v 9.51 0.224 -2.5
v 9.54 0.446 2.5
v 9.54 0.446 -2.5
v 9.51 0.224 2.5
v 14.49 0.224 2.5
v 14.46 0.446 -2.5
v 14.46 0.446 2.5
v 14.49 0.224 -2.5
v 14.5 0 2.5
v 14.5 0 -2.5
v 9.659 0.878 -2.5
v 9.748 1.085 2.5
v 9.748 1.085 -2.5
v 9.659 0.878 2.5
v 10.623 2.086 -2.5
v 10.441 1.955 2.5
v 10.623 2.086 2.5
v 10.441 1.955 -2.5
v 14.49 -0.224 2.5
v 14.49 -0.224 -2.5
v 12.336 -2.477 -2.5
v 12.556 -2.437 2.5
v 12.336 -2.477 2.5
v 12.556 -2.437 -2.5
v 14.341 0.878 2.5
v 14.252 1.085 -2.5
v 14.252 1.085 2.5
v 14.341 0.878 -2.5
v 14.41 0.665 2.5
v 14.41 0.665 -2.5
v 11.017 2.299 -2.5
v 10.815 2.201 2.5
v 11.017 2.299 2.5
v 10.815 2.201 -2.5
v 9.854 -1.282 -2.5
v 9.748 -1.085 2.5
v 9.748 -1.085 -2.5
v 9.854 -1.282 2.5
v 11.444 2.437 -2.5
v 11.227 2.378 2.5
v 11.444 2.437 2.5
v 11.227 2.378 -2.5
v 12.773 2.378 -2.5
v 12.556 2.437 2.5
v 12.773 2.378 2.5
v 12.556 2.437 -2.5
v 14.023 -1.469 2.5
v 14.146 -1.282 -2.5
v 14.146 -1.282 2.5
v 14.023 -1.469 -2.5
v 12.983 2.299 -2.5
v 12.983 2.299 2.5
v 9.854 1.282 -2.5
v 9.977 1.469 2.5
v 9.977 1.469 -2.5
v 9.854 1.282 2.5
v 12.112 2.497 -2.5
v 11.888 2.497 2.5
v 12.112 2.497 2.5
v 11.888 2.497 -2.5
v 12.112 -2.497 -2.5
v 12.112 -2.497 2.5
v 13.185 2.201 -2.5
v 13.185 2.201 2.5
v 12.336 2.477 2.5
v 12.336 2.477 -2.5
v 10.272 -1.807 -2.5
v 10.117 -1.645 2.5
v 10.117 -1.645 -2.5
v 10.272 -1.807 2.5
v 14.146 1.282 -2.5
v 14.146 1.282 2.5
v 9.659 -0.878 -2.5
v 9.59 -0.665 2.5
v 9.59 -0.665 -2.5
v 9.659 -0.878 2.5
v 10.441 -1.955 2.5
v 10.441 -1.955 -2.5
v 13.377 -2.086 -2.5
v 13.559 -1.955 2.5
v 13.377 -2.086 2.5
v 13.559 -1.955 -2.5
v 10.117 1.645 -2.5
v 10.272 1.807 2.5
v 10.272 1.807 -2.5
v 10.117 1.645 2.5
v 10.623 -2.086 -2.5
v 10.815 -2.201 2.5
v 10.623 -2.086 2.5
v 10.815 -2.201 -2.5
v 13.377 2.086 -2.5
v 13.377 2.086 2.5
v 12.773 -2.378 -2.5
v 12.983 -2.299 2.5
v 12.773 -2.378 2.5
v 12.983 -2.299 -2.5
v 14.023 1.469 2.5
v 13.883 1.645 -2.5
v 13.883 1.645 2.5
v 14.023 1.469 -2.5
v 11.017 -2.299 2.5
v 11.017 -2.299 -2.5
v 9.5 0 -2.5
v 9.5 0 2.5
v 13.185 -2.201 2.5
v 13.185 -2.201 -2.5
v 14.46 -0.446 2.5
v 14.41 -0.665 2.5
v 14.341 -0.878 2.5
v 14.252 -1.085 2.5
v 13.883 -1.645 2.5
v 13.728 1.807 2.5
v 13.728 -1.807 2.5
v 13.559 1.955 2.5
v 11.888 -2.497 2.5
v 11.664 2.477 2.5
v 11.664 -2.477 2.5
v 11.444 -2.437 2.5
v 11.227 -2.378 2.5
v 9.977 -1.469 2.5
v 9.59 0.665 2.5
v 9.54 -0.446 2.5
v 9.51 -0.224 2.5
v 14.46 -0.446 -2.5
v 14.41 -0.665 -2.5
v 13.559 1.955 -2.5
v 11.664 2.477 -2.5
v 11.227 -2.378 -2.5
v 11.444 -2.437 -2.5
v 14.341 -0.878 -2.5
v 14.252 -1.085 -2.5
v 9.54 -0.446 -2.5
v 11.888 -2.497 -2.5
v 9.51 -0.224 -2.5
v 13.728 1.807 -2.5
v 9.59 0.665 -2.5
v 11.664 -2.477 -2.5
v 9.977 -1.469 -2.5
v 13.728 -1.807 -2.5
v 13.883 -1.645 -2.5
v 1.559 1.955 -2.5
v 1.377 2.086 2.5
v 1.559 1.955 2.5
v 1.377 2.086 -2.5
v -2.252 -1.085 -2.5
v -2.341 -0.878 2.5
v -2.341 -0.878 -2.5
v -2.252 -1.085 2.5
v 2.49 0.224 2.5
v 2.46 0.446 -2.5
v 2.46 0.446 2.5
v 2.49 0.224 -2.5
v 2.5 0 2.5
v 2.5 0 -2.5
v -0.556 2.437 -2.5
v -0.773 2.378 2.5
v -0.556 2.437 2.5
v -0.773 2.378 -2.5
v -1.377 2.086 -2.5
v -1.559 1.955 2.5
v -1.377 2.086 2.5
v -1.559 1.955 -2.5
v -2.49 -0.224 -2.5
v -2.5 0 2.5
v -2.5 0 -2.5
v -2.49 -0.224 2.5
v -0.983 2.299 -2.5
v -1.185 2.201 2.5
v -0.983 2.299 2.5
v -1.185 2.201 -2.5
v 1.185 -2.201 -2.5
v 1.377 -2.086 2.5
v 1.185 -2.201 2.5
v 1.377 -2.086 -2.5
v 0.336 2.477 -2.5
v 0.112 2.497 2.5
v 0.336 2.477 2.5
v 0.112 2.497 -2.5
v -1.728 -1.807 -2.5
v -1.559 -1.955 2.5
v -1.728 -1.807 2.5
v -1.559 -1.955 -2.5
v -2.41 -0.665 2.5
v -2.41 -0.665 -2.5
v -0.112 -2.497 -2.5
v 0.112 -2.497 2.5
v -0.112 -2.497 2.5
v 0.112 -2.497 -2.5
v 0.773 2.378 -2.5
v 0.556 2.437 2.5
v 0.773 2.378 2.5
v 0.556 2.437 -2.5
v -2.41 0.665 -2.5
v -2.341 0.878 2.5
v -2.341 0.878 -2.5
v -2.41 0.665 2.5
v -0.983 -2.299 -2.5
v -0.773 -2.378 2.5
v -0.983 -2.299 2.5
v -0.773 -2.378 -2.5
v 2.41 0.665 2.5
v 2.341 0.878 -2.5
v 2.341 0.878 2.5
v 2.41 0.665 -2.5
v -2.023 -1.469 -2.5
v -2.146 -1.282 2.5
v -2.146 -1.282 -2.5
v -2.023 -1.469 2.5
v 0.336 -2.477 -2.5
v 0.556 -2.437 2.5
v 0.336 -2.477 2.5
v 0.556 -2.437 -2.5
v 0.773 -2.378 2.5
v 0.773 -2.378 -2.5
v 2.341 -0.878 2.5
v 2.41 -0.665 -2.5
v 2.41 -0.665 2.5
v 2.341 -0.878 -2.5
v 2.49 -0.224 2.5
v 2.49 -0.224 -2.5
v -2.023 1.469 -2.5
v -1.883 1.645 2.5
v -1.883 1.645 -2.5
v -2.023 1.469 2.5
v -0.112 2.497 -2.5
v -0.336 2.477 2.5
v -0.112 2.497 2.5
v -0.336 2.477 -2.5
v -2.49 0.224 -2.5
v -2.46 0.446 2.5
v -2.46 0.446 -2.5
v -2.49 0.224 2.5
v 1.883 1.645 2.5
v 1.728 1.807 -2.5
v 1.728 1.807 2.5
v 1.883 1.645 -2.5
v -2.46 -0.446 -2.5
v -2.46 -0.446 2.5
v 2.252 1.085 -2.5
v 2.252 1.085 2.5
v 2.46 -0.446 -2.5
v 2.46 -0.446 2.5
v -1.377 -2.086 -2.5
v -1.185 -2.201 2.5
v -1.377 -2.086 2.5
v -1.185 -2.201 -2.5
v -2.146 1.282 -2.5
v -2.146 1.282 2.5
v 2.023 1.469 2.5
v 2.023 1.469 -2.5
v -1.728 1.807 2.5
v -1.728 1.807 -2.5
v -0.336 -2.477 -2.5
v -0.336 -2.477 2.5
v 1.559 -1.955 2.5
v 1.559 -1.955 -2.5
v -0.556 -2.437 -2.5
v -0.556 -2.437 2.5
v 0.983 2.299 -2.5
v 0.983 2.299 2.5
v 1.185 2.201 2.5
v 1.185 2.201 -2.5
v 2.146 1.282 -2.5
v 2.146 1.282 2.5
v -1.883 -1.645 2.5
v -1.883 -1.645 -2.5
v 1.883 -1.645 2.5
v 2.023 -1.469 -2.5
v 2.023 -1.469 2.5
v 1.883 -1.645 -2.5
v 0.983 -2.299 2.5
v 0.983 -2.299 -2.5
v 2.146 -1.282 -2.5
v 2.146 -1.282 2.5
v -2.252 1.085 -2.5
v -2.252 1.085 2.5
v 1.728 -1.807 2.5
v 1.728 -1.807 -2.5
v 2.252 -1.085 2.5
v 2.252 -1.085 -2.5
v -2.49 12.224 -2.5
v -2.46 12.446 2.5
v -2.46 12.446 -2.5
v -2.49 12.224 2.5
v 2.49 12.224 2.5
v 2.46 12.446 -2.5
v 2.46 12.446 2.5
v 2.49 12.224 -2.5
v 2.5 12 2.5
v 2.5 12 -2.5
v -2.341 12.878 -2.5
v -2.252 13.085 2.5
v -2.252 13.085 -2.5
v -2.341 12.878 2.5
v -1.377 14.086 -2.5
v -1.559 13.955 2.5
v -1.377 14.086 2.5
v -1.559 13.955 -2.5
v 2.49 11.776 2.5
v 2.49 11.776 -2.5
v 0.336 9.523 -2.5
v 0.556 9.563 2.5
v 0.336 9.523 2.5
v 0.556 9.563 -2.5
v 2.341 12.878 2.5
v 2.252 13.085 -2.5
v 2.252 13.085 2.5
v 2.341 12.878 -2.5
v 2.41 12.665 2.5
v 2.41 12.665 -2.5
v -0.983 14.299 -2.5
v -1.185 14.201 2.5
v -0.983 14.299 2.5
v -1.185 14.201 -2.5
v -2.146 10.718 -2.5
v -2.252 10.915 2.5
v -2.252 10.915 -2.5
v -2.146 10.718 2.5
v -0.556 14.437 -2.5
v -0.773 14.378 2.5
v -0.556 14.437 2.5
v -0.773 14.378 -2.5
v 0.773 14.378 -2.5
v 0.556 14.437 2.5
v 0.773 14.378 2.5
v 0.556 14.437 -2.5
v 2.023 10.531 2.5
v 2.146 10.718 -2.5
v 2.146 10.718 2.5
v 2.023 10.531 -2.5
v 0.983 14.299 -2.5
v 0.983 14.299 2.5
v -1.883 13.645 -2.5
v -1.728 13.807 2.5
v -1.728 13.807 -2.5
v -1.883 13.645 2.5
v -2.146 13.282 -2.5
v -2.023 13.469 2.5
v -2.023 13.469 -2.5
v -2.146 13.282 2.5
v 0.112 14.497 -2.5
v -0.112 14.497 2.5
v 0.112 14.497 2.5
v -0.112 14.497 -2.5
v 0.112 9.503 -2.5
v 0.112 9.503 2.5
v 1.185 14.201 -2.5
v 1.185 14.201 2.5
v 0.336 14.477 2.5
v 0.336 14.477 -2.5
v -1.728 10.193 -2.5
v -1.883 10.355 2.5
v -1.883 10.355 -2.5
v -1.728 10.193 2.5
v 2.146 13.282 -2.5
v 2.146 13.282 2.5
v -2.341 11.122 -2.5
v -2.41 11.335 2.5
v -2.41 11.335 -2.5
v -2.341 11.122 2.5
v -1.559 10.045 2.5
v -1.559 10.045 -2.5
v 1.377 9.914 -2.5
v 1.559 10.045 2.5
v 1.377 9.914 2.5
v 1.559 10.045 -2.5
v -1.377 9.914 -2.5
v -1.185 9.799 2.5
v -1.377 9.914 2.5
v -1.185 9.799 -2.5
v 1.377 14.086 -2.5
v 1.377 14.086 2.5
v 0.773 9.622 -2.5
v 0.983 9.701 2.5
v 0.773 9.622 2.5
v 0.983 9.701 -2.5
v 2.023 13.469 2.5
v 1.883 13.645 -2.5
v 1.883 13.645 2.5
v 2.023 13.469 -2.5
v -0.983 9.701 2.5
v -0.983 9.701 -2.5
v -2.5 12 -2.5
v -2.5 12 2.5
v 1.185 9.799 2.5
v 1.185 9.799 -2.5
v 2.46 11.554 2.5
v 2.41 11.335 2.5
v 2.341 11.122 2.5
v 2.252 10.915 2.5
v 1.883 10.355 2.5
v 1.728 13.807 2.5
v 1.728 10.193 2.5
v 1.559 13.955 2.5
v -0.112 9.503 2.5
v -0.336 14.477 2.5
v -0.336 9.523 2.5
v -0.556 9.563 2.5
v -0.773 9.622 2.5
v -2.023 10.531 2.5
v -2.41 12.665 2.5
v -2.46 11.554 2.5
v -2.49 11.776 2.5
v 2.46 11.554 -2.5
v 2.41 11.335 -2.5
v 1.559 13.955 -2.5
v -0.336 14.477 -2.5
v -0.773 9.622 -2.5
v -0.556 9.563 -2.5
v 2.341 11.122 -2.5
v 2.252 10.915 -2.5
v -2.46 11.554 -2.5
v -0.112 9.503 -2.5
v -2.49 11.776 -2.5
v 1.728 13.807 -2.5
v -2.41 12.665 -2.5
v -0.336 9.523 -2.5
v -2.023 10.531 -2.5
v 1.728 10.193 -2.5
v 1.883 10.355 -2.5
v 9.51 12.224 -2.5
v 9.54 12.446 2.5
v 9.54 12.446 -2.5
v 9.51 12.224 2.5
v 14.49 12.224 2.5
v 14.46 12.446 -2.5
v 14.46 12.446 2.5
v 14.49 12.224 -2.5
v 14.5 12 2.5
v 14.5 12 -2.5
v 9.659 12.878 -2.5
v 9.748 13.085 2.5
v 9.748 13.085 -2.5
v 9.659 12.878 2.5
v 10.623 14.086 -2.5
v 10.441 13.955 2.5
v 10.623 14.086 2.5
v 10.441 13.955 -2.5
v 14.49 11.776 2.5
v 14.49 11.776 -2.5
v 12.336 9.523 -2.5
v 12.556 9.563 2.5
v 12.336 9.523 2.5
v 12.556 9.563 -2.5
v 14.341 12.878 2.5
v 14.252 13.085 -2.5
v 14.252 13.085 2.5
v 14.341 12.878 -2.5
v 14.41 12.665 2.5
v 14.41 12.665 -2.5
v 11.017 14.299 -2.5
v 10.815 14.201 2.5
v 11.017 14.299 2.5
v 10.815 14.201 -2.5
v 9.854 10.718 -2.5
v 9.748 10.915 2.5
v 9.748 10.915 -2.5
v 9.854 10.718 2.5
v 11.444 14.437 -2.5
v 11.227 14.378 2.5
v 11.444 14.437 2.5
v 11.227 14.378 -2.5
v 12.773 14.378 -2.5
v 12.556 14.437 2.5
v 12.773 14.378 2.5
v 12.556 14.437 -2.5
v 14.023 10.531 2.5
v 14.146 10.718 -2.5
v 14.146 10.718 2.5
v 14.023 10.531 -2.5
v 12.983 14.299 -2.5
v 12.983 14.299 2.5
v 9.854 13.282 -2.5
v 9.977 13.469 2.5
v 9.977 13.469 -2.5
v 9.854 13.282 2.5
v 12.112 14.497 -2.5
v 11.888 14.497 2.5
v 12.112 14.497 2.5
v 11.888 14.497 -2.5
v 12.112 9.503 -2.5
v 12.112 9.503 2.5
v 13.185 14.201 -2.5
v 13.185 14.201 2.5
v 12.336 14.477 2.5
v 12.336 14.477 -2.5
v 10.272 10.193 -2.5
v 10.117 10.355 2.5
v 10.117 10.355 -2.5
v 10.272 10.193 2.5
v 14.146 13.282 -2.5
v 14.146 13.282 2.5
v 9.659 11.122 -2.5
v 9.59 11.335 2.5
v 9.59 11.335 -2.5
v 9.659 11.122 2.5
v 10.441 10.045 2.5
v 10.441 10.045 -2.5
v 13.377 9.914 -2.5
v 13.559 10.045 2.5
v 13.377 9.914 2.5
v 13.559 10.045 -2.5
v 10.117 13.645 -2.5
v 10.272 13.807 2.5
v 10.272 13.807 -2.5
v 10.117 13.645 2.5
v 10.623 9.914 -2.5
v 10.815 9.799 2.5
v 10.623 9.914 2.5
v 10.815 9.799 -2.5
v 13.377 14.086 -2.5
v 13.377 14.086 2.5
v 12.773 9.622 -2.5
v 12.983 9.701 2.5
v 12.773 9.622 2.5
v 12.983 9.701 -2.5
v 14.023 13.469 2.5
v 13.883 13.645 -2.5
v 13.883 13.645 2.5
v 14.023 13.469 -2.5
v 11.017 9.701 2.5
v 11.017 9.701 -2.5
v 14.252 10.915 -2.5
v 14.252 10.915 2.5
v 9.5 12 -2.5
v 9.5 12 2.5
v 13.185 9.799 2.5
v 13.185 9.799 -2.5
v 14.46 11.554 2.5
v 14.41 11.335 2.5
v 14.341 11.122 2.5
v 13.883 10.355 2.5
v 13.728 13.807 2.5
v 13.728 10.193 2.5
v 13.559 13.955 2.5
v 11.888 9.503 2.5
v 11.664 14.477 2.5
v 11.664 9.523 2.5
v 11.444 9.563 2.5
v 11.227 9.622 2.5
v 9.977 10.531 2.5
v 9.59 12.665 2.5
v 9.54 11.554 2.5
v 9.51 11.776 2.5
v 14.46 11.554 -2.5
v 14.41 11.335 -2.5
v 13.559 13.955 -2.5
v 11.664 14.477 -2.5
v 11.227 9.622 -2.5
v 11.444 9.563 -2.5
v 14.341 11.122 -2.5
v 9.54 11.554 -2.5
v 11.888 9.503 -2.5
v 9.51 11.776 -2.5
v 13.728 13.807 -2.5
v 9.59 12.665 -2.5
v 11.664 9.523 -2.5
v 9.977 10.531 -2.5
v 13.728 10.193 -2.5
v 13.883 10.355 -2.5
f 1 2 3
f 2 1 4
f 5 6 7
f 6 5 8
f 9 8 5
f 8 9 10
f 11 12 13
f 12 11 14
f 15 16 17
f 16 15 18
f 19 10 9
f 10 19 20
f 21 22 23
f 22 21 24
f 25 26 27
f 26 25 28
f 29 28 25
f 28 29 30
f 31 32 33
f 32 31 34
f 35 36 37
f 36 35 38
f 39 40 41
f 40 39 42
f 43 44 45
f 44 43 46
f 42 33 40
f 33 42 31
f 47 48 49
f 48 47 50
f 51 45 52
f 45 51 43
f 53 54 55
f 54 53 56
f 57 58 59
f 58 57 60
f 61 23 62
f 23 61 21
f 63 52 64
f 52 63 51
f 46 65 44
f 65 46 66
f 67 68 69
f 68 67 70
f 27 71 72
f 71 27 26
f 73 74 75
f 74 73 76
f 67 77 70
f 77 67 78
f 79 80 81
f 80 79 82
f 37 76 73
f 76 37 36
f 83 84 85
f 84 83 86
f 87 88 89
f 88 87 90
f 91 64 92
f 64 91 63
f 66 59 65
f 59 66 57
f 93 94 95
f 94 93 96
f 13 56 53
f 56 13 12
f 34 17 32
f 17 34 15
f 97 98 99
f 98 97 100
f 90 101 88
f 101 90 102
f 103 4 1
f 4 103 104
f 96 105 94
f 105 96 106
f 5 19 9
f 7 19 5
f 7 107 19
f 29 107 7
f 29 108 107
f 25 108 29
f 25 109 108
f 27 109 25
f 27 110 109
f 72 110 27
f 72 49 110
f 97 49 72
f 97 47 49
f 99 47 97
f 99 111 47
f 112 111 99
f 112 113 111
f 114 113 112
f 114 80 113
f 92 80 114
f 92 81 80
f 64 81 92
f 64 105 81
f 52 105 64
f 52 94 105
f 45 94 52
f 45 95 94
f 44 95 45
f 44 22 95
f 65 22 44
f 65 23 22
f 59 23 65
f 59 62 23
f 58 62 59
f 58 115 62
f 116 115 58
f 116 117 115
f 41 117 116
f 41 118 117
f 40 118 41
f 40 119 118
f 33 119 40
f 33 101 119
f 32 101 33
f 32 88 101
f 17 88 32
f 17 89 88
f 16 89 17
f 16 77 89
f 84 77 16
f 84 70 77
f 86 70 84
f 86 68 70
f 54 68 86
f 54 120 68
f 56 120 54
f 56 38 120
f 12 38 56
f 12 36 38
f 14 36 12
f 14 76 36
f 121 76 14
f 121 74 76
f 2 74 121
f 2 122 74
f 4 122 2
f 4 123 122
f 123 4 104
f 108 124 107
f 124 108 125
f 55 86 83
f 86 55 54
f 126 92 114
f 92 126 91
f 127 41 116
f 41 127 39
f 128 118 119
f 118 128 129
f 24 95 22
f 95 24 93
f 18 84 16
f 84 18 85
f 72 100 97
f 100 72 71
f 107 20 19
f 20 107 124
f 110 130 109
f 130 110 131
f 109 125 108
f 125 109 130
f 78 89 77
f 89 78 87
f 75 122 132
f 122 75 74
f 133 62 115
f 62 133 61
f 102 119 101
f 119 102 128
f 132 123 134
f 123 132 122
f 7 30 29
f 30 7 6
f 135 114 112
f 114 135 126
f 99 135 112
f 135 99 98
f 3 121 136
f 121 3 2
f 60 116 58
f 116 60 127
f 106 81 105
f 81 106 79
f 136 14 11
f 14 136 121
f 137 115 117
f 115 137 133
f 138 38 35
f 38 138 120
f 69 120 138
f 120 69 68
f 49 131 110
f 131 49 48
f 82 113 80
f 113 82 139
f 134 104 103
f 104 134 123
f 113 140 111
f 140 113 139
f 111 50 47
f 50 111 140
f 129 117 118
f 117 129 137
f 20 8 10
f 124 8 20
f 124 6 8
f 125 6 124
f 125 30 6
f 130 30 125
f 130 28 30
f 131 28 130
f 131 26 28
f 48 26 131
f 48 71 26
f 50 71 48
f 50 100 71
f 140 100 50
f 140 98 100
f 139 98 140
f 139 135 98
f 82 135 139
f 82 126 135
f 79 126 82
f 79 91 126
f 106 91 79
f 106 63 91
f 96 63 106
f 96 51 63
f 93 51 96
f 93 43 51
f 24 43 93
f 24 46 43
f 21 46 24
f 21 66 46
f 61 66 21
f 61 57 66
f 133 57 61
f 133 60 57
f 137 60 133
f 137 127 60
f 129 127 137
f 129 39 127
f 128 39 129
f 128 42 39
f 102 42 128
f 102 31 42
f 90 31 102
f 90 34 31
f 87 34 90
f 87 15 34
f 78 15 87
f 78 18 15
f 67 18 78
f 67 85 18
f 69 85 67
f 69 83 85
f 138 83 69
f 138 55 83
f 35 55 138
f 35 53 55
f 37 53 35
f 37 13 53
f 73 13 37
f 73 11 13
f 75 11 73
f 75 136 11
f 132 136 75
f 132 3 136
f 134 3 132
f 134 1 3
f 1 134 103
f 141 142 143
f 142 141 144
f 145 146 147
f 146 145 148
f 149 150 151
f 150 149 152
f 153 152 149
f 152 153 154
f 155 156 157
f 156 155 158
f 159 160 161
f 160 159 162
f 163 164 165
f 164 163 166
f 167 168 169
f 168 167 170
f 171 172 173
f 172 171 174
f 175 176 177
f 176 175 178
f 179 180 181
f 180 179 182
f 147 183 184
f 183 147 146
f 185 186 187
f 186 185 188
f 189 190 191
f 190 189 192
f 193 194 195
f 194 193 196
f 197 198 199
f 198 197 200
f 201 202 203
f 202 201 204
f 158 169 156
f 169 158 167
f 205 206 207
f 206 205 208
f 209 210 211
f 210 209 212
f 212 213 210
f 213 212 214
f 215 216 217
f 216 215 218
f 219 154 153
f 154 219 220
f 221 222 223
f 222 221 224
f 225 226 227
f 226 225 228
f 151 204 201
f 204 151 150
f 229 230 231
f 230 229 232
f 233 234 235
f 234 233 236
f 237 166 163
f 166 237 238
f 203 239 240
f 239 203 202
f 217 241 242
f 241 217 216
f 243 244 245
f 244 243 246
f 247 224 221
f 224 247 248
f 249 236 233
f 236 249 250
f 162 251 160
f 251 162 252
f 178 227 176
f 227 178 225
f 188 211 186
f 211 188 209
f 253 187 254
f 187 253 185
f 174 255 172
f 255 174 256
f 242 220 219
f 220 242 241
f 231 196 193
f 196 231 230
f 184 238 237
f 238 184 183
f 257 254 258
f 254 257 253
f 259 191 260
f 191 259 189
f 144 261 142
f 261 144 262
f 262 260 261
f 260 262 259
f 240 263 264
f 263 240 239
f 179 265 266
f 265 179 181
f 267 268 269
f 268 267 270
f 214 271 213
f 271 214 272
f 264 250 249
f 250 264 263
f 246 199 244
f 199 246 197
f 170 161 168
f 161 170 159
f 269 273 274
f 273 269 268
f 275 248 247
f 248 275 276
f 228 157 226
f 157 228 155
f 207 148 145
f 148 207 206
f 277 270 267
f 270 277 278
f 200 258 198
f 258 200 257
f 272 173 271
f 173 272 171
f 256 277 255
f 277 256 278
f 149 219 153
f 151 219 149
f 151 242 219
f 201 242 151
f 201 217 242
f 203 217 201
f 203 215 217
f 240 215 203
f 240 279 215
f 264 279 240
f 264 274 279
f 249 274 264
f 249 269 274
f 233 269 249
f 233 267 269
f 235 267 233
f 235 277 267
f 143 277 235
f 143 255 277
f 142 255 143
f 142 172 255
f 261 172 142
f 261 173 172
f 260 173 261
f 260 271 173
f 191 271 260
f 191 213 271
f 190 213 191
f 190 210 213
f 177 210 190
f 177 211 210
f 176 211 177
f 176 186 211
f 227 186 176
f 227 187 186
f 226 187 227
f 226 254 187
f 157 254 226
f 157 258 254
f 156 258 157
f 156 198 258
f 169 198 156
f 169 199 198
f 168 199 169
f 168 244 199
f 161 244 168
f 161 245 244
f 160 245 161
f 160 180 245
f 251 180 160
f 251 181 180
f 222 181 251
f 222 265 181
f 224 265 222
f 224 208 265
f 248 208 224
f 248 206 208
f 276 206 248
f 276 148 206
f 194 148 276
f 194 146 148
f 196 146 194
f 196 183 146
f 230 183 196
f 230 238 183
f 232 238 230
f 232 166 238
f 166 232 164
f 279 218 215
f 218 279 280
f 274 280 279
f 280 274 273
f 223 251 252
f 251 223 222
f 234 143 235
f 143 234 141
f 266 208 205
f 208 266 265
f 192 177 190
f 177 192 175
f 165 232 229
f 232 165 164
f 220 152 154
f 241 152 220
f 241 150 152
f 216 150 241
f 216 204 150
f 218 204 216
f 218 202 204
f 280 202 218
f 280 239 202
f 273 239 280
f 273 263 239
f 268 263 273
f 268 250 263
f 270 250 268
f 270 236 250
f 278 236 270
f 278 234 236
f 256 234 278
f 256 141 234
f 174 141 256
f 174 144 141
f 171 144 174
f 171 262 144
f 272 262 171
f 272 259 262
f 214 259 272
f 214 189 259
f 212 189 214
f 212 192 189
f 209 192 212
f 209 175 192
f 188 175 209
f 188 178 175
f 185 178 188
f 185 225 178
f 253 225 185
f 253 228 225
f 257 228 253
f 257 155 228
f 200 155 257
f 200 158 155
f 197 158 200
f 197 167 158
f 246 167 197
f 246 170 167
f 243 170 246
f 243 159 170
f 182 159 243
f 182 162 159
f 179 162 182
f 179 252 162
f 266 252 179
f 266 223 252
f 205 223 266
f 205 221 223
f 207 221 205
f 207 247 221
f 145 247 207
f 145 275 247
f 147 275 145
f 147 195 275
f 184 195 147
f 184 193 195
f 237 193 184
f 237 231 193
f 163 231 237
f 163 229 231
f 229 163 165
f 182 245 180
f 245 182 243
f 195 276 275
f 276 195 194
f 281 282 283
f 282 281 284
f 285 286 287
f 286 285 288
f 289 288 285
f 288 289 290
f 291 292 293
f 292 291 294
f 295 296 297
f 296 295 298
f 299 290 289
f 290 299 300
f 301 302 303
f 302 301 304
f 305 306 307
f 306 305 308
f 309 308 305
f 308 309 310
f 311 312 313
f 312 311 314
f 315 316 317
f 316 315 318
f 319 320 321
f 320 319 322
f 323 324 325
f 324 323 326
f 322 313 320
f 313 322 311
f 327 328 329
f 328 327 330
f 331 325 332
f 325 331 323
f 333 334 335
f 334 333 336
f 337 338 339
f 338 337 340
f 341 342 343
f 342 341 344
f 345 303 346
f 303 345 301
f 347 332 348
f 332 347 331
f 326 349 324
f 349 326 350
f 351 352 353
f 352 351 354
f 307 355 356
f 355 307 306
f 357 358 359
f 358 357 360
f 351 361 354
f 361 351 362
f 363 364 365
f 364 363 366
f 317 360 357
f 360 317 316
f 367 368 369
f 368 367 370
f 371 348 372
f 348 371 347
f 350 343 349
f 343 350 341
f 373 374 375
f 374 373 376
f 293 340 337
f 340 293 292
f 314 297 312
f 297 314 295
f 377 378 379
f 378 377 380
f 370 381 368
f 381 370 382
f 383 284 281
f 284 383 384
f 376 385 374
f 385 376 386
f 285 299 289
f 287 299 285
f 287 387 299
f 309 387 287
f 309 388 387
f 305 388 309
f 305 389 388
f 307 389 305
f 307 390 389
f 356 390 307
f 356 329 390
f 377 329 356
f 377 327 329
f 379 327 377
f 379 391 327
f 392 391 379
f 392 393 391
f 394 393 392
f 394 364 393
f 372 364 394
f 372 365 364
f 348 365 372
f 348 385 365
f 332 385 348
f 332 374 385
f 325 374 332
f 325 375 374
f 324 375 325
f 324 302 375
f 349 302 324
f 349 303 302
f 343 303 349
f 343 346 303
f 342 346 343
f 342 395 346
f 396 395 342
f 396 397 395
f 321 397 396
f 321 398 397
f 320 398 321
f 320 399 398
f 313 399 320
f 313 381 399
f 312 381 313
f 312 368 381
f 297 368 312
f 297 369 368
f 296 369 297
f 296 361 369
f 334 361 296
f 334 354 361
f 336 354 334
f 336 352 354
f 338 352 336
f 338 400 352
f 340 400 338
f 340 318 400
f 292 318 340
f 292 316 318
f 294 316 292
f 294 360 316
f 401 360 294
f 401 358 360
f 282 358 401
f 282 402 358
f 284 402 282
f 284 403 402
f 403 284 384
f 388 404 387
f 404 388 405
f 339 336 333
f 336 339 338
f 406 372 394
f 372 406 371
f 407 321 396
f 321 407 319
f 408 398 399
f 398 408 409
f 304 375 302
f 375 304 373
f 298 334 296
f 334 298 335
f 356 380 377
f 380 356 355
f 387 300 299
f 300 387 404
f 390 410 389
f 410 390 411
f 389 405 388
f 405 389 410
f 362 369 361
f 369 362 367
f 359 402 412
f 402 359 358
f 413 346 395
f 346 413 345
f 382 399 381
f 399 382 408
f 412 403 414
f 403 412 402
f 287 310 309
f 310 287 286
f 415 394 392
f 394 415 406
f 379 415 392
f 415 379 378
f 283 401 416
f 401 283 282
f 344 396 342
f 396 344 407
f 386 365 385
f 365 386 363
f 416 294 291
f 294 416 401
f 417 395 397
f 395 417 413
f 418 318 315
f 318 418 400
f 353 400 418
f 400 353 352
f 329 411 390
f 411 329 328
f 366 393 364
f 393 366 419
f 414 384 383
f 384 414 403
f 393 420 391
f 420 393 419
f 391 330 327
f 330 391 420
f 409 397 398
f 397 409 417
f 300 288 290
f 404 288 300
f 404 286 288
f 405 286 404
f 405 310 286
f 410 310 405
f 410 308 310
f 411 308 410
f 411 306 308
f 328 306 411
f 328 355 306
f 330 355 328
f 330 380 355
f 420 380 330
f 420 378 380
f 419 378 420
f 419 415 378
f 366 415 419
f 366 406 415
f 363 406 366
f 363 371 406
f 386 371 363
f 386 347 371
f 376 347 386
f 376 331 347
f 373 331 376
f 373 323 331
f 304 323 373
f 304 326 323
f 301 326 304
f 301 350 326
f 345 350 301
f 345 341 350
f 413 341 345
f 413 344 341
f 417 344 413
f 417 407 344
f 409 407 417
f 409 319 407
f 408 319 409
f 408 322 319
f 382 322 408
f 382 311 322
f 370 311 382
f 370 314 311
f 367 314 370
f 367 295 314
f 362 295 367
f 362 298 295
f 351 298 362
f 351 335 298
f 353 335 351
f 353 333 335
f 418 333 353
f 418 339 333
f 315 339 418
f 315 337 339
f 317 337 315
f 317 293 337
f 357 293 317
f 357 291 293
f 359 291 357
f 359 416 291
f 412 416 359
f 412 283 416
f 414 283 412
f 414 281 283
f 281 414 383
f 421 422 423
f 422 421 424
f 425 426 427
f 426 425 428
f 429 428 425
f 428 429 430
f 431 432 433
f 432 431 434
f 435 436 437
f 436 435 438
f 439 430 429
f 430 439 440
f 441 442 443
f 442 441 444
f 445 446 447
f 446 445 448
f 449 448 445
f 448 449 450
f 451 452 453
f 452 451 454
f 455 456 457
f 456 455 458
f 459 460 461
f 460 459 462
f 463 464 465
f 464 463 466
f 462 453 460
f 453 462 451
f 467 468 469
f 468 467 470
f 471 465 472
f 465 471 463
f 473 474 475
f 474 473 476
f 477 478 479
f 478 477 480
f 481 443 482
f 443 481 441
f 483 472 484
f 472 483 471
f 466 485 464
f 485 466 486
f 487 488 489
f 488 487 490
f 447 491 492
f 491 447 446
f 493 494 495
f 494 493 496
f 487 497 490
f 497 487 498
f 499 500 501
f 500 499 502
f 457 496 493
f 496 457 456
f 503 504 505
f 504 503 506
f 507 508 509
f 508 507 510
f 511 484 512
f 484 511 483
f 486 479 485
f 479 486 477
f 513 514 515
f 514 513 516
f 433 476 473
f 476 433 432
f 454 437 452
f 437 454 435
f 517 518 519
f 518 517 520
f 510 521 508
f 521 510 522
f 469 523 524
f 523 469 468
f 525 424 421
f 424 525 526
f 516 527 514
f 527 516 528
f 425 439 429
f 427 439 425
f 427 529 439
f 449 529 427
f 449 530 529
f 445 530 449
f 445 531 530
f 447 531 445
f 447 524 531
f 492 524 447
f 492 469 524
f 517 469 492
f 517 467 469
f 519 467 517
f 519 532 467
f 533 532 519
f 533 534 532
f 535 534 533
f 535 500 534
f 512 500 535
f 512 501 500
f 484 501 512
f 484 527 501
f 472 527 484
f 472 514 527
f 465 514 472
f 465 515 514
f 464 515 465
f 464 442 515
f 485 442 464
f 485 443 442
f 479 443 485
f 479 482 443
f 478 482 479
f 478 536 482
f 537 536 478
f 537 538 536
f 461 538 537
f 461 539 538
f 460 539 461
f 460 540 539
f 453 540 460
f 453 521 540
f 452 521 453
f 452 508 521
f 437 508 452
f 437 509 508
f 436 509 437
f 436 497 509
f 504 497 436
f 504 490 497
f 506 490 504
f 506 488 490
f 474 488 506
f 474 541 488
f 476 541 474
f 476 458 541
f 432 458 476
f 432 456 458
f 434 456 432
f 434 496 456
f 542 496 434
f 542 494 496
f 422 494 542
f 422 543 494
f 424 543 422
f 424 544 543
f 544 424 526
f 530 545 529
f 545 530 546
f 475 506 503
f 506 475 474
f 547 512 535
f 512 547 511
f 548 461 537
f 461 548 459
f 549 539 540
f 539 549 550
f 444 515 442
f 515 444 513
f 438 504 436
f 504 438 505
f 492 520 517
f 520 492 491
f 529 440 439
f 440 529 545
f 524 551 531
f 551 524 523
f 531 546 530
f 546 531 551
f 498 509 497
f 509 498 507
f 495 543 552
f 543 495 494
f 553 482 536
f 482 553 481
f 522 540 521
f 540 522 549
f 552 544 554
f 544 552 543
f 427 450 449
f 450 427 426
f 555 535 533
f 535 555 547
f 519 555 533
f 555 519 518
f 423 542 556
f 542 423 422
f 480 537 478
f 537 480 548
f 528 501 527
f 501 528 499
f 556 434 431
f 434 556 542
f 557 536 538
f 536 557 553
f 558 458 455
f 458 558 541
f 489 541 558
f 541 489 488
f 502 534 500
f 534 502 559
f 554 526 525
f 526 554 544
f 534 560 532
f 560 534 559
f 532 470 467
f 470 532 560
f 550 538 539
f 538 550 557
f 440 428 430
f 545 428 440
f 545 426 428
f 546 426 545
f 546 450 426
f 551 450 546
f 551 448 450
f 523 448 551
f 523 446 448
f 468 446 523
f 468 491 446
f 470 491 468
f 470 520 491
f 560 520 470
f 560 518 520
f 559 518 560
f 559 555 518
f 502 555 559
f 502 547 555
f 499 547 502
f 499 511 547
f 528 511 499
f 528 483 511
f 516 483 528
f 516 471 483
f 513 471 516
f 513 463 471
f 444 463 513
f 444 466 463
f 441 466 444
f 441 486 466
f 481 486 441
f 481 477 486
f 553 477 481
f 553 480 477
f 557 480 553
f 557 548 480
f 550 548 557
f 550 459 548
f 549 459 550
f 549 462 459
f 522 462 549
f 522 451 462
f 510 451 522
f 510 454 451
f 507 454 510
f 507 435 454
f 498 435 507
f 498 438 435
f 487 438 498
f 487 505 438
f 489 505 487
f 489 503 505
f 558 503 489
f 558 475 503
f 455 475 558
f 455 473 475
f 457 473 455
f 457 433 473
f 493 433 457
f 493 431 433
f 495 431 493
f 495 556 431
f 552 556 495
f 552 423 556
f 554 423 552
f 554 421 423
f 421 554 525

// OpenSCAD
$fn=70;


color( "SlateGray", 1.0 )


translate([12,0,0])
color( "LightSlateGray", 1.0 )
cylinder(h = 5, r1 = 2.5, r2 = 2.5, center = true);

translate([0,0,0])
color( "LightSlateGray", 1.0 )
cylinder(h = 5, r1 = 2.5, r2 = 2.5, center = true);

translate([0,12,0])
color( "LightSlateGray", 1.0 )
cylinder(h = 5, r1 = 2.5, r2 = 2.5, center = true);

translate([12,12,0])
color( "LightSlateGray", 1.0 )
cylinder(h = 5, r1 = 2.5, r2 = 2.5, center = true);
